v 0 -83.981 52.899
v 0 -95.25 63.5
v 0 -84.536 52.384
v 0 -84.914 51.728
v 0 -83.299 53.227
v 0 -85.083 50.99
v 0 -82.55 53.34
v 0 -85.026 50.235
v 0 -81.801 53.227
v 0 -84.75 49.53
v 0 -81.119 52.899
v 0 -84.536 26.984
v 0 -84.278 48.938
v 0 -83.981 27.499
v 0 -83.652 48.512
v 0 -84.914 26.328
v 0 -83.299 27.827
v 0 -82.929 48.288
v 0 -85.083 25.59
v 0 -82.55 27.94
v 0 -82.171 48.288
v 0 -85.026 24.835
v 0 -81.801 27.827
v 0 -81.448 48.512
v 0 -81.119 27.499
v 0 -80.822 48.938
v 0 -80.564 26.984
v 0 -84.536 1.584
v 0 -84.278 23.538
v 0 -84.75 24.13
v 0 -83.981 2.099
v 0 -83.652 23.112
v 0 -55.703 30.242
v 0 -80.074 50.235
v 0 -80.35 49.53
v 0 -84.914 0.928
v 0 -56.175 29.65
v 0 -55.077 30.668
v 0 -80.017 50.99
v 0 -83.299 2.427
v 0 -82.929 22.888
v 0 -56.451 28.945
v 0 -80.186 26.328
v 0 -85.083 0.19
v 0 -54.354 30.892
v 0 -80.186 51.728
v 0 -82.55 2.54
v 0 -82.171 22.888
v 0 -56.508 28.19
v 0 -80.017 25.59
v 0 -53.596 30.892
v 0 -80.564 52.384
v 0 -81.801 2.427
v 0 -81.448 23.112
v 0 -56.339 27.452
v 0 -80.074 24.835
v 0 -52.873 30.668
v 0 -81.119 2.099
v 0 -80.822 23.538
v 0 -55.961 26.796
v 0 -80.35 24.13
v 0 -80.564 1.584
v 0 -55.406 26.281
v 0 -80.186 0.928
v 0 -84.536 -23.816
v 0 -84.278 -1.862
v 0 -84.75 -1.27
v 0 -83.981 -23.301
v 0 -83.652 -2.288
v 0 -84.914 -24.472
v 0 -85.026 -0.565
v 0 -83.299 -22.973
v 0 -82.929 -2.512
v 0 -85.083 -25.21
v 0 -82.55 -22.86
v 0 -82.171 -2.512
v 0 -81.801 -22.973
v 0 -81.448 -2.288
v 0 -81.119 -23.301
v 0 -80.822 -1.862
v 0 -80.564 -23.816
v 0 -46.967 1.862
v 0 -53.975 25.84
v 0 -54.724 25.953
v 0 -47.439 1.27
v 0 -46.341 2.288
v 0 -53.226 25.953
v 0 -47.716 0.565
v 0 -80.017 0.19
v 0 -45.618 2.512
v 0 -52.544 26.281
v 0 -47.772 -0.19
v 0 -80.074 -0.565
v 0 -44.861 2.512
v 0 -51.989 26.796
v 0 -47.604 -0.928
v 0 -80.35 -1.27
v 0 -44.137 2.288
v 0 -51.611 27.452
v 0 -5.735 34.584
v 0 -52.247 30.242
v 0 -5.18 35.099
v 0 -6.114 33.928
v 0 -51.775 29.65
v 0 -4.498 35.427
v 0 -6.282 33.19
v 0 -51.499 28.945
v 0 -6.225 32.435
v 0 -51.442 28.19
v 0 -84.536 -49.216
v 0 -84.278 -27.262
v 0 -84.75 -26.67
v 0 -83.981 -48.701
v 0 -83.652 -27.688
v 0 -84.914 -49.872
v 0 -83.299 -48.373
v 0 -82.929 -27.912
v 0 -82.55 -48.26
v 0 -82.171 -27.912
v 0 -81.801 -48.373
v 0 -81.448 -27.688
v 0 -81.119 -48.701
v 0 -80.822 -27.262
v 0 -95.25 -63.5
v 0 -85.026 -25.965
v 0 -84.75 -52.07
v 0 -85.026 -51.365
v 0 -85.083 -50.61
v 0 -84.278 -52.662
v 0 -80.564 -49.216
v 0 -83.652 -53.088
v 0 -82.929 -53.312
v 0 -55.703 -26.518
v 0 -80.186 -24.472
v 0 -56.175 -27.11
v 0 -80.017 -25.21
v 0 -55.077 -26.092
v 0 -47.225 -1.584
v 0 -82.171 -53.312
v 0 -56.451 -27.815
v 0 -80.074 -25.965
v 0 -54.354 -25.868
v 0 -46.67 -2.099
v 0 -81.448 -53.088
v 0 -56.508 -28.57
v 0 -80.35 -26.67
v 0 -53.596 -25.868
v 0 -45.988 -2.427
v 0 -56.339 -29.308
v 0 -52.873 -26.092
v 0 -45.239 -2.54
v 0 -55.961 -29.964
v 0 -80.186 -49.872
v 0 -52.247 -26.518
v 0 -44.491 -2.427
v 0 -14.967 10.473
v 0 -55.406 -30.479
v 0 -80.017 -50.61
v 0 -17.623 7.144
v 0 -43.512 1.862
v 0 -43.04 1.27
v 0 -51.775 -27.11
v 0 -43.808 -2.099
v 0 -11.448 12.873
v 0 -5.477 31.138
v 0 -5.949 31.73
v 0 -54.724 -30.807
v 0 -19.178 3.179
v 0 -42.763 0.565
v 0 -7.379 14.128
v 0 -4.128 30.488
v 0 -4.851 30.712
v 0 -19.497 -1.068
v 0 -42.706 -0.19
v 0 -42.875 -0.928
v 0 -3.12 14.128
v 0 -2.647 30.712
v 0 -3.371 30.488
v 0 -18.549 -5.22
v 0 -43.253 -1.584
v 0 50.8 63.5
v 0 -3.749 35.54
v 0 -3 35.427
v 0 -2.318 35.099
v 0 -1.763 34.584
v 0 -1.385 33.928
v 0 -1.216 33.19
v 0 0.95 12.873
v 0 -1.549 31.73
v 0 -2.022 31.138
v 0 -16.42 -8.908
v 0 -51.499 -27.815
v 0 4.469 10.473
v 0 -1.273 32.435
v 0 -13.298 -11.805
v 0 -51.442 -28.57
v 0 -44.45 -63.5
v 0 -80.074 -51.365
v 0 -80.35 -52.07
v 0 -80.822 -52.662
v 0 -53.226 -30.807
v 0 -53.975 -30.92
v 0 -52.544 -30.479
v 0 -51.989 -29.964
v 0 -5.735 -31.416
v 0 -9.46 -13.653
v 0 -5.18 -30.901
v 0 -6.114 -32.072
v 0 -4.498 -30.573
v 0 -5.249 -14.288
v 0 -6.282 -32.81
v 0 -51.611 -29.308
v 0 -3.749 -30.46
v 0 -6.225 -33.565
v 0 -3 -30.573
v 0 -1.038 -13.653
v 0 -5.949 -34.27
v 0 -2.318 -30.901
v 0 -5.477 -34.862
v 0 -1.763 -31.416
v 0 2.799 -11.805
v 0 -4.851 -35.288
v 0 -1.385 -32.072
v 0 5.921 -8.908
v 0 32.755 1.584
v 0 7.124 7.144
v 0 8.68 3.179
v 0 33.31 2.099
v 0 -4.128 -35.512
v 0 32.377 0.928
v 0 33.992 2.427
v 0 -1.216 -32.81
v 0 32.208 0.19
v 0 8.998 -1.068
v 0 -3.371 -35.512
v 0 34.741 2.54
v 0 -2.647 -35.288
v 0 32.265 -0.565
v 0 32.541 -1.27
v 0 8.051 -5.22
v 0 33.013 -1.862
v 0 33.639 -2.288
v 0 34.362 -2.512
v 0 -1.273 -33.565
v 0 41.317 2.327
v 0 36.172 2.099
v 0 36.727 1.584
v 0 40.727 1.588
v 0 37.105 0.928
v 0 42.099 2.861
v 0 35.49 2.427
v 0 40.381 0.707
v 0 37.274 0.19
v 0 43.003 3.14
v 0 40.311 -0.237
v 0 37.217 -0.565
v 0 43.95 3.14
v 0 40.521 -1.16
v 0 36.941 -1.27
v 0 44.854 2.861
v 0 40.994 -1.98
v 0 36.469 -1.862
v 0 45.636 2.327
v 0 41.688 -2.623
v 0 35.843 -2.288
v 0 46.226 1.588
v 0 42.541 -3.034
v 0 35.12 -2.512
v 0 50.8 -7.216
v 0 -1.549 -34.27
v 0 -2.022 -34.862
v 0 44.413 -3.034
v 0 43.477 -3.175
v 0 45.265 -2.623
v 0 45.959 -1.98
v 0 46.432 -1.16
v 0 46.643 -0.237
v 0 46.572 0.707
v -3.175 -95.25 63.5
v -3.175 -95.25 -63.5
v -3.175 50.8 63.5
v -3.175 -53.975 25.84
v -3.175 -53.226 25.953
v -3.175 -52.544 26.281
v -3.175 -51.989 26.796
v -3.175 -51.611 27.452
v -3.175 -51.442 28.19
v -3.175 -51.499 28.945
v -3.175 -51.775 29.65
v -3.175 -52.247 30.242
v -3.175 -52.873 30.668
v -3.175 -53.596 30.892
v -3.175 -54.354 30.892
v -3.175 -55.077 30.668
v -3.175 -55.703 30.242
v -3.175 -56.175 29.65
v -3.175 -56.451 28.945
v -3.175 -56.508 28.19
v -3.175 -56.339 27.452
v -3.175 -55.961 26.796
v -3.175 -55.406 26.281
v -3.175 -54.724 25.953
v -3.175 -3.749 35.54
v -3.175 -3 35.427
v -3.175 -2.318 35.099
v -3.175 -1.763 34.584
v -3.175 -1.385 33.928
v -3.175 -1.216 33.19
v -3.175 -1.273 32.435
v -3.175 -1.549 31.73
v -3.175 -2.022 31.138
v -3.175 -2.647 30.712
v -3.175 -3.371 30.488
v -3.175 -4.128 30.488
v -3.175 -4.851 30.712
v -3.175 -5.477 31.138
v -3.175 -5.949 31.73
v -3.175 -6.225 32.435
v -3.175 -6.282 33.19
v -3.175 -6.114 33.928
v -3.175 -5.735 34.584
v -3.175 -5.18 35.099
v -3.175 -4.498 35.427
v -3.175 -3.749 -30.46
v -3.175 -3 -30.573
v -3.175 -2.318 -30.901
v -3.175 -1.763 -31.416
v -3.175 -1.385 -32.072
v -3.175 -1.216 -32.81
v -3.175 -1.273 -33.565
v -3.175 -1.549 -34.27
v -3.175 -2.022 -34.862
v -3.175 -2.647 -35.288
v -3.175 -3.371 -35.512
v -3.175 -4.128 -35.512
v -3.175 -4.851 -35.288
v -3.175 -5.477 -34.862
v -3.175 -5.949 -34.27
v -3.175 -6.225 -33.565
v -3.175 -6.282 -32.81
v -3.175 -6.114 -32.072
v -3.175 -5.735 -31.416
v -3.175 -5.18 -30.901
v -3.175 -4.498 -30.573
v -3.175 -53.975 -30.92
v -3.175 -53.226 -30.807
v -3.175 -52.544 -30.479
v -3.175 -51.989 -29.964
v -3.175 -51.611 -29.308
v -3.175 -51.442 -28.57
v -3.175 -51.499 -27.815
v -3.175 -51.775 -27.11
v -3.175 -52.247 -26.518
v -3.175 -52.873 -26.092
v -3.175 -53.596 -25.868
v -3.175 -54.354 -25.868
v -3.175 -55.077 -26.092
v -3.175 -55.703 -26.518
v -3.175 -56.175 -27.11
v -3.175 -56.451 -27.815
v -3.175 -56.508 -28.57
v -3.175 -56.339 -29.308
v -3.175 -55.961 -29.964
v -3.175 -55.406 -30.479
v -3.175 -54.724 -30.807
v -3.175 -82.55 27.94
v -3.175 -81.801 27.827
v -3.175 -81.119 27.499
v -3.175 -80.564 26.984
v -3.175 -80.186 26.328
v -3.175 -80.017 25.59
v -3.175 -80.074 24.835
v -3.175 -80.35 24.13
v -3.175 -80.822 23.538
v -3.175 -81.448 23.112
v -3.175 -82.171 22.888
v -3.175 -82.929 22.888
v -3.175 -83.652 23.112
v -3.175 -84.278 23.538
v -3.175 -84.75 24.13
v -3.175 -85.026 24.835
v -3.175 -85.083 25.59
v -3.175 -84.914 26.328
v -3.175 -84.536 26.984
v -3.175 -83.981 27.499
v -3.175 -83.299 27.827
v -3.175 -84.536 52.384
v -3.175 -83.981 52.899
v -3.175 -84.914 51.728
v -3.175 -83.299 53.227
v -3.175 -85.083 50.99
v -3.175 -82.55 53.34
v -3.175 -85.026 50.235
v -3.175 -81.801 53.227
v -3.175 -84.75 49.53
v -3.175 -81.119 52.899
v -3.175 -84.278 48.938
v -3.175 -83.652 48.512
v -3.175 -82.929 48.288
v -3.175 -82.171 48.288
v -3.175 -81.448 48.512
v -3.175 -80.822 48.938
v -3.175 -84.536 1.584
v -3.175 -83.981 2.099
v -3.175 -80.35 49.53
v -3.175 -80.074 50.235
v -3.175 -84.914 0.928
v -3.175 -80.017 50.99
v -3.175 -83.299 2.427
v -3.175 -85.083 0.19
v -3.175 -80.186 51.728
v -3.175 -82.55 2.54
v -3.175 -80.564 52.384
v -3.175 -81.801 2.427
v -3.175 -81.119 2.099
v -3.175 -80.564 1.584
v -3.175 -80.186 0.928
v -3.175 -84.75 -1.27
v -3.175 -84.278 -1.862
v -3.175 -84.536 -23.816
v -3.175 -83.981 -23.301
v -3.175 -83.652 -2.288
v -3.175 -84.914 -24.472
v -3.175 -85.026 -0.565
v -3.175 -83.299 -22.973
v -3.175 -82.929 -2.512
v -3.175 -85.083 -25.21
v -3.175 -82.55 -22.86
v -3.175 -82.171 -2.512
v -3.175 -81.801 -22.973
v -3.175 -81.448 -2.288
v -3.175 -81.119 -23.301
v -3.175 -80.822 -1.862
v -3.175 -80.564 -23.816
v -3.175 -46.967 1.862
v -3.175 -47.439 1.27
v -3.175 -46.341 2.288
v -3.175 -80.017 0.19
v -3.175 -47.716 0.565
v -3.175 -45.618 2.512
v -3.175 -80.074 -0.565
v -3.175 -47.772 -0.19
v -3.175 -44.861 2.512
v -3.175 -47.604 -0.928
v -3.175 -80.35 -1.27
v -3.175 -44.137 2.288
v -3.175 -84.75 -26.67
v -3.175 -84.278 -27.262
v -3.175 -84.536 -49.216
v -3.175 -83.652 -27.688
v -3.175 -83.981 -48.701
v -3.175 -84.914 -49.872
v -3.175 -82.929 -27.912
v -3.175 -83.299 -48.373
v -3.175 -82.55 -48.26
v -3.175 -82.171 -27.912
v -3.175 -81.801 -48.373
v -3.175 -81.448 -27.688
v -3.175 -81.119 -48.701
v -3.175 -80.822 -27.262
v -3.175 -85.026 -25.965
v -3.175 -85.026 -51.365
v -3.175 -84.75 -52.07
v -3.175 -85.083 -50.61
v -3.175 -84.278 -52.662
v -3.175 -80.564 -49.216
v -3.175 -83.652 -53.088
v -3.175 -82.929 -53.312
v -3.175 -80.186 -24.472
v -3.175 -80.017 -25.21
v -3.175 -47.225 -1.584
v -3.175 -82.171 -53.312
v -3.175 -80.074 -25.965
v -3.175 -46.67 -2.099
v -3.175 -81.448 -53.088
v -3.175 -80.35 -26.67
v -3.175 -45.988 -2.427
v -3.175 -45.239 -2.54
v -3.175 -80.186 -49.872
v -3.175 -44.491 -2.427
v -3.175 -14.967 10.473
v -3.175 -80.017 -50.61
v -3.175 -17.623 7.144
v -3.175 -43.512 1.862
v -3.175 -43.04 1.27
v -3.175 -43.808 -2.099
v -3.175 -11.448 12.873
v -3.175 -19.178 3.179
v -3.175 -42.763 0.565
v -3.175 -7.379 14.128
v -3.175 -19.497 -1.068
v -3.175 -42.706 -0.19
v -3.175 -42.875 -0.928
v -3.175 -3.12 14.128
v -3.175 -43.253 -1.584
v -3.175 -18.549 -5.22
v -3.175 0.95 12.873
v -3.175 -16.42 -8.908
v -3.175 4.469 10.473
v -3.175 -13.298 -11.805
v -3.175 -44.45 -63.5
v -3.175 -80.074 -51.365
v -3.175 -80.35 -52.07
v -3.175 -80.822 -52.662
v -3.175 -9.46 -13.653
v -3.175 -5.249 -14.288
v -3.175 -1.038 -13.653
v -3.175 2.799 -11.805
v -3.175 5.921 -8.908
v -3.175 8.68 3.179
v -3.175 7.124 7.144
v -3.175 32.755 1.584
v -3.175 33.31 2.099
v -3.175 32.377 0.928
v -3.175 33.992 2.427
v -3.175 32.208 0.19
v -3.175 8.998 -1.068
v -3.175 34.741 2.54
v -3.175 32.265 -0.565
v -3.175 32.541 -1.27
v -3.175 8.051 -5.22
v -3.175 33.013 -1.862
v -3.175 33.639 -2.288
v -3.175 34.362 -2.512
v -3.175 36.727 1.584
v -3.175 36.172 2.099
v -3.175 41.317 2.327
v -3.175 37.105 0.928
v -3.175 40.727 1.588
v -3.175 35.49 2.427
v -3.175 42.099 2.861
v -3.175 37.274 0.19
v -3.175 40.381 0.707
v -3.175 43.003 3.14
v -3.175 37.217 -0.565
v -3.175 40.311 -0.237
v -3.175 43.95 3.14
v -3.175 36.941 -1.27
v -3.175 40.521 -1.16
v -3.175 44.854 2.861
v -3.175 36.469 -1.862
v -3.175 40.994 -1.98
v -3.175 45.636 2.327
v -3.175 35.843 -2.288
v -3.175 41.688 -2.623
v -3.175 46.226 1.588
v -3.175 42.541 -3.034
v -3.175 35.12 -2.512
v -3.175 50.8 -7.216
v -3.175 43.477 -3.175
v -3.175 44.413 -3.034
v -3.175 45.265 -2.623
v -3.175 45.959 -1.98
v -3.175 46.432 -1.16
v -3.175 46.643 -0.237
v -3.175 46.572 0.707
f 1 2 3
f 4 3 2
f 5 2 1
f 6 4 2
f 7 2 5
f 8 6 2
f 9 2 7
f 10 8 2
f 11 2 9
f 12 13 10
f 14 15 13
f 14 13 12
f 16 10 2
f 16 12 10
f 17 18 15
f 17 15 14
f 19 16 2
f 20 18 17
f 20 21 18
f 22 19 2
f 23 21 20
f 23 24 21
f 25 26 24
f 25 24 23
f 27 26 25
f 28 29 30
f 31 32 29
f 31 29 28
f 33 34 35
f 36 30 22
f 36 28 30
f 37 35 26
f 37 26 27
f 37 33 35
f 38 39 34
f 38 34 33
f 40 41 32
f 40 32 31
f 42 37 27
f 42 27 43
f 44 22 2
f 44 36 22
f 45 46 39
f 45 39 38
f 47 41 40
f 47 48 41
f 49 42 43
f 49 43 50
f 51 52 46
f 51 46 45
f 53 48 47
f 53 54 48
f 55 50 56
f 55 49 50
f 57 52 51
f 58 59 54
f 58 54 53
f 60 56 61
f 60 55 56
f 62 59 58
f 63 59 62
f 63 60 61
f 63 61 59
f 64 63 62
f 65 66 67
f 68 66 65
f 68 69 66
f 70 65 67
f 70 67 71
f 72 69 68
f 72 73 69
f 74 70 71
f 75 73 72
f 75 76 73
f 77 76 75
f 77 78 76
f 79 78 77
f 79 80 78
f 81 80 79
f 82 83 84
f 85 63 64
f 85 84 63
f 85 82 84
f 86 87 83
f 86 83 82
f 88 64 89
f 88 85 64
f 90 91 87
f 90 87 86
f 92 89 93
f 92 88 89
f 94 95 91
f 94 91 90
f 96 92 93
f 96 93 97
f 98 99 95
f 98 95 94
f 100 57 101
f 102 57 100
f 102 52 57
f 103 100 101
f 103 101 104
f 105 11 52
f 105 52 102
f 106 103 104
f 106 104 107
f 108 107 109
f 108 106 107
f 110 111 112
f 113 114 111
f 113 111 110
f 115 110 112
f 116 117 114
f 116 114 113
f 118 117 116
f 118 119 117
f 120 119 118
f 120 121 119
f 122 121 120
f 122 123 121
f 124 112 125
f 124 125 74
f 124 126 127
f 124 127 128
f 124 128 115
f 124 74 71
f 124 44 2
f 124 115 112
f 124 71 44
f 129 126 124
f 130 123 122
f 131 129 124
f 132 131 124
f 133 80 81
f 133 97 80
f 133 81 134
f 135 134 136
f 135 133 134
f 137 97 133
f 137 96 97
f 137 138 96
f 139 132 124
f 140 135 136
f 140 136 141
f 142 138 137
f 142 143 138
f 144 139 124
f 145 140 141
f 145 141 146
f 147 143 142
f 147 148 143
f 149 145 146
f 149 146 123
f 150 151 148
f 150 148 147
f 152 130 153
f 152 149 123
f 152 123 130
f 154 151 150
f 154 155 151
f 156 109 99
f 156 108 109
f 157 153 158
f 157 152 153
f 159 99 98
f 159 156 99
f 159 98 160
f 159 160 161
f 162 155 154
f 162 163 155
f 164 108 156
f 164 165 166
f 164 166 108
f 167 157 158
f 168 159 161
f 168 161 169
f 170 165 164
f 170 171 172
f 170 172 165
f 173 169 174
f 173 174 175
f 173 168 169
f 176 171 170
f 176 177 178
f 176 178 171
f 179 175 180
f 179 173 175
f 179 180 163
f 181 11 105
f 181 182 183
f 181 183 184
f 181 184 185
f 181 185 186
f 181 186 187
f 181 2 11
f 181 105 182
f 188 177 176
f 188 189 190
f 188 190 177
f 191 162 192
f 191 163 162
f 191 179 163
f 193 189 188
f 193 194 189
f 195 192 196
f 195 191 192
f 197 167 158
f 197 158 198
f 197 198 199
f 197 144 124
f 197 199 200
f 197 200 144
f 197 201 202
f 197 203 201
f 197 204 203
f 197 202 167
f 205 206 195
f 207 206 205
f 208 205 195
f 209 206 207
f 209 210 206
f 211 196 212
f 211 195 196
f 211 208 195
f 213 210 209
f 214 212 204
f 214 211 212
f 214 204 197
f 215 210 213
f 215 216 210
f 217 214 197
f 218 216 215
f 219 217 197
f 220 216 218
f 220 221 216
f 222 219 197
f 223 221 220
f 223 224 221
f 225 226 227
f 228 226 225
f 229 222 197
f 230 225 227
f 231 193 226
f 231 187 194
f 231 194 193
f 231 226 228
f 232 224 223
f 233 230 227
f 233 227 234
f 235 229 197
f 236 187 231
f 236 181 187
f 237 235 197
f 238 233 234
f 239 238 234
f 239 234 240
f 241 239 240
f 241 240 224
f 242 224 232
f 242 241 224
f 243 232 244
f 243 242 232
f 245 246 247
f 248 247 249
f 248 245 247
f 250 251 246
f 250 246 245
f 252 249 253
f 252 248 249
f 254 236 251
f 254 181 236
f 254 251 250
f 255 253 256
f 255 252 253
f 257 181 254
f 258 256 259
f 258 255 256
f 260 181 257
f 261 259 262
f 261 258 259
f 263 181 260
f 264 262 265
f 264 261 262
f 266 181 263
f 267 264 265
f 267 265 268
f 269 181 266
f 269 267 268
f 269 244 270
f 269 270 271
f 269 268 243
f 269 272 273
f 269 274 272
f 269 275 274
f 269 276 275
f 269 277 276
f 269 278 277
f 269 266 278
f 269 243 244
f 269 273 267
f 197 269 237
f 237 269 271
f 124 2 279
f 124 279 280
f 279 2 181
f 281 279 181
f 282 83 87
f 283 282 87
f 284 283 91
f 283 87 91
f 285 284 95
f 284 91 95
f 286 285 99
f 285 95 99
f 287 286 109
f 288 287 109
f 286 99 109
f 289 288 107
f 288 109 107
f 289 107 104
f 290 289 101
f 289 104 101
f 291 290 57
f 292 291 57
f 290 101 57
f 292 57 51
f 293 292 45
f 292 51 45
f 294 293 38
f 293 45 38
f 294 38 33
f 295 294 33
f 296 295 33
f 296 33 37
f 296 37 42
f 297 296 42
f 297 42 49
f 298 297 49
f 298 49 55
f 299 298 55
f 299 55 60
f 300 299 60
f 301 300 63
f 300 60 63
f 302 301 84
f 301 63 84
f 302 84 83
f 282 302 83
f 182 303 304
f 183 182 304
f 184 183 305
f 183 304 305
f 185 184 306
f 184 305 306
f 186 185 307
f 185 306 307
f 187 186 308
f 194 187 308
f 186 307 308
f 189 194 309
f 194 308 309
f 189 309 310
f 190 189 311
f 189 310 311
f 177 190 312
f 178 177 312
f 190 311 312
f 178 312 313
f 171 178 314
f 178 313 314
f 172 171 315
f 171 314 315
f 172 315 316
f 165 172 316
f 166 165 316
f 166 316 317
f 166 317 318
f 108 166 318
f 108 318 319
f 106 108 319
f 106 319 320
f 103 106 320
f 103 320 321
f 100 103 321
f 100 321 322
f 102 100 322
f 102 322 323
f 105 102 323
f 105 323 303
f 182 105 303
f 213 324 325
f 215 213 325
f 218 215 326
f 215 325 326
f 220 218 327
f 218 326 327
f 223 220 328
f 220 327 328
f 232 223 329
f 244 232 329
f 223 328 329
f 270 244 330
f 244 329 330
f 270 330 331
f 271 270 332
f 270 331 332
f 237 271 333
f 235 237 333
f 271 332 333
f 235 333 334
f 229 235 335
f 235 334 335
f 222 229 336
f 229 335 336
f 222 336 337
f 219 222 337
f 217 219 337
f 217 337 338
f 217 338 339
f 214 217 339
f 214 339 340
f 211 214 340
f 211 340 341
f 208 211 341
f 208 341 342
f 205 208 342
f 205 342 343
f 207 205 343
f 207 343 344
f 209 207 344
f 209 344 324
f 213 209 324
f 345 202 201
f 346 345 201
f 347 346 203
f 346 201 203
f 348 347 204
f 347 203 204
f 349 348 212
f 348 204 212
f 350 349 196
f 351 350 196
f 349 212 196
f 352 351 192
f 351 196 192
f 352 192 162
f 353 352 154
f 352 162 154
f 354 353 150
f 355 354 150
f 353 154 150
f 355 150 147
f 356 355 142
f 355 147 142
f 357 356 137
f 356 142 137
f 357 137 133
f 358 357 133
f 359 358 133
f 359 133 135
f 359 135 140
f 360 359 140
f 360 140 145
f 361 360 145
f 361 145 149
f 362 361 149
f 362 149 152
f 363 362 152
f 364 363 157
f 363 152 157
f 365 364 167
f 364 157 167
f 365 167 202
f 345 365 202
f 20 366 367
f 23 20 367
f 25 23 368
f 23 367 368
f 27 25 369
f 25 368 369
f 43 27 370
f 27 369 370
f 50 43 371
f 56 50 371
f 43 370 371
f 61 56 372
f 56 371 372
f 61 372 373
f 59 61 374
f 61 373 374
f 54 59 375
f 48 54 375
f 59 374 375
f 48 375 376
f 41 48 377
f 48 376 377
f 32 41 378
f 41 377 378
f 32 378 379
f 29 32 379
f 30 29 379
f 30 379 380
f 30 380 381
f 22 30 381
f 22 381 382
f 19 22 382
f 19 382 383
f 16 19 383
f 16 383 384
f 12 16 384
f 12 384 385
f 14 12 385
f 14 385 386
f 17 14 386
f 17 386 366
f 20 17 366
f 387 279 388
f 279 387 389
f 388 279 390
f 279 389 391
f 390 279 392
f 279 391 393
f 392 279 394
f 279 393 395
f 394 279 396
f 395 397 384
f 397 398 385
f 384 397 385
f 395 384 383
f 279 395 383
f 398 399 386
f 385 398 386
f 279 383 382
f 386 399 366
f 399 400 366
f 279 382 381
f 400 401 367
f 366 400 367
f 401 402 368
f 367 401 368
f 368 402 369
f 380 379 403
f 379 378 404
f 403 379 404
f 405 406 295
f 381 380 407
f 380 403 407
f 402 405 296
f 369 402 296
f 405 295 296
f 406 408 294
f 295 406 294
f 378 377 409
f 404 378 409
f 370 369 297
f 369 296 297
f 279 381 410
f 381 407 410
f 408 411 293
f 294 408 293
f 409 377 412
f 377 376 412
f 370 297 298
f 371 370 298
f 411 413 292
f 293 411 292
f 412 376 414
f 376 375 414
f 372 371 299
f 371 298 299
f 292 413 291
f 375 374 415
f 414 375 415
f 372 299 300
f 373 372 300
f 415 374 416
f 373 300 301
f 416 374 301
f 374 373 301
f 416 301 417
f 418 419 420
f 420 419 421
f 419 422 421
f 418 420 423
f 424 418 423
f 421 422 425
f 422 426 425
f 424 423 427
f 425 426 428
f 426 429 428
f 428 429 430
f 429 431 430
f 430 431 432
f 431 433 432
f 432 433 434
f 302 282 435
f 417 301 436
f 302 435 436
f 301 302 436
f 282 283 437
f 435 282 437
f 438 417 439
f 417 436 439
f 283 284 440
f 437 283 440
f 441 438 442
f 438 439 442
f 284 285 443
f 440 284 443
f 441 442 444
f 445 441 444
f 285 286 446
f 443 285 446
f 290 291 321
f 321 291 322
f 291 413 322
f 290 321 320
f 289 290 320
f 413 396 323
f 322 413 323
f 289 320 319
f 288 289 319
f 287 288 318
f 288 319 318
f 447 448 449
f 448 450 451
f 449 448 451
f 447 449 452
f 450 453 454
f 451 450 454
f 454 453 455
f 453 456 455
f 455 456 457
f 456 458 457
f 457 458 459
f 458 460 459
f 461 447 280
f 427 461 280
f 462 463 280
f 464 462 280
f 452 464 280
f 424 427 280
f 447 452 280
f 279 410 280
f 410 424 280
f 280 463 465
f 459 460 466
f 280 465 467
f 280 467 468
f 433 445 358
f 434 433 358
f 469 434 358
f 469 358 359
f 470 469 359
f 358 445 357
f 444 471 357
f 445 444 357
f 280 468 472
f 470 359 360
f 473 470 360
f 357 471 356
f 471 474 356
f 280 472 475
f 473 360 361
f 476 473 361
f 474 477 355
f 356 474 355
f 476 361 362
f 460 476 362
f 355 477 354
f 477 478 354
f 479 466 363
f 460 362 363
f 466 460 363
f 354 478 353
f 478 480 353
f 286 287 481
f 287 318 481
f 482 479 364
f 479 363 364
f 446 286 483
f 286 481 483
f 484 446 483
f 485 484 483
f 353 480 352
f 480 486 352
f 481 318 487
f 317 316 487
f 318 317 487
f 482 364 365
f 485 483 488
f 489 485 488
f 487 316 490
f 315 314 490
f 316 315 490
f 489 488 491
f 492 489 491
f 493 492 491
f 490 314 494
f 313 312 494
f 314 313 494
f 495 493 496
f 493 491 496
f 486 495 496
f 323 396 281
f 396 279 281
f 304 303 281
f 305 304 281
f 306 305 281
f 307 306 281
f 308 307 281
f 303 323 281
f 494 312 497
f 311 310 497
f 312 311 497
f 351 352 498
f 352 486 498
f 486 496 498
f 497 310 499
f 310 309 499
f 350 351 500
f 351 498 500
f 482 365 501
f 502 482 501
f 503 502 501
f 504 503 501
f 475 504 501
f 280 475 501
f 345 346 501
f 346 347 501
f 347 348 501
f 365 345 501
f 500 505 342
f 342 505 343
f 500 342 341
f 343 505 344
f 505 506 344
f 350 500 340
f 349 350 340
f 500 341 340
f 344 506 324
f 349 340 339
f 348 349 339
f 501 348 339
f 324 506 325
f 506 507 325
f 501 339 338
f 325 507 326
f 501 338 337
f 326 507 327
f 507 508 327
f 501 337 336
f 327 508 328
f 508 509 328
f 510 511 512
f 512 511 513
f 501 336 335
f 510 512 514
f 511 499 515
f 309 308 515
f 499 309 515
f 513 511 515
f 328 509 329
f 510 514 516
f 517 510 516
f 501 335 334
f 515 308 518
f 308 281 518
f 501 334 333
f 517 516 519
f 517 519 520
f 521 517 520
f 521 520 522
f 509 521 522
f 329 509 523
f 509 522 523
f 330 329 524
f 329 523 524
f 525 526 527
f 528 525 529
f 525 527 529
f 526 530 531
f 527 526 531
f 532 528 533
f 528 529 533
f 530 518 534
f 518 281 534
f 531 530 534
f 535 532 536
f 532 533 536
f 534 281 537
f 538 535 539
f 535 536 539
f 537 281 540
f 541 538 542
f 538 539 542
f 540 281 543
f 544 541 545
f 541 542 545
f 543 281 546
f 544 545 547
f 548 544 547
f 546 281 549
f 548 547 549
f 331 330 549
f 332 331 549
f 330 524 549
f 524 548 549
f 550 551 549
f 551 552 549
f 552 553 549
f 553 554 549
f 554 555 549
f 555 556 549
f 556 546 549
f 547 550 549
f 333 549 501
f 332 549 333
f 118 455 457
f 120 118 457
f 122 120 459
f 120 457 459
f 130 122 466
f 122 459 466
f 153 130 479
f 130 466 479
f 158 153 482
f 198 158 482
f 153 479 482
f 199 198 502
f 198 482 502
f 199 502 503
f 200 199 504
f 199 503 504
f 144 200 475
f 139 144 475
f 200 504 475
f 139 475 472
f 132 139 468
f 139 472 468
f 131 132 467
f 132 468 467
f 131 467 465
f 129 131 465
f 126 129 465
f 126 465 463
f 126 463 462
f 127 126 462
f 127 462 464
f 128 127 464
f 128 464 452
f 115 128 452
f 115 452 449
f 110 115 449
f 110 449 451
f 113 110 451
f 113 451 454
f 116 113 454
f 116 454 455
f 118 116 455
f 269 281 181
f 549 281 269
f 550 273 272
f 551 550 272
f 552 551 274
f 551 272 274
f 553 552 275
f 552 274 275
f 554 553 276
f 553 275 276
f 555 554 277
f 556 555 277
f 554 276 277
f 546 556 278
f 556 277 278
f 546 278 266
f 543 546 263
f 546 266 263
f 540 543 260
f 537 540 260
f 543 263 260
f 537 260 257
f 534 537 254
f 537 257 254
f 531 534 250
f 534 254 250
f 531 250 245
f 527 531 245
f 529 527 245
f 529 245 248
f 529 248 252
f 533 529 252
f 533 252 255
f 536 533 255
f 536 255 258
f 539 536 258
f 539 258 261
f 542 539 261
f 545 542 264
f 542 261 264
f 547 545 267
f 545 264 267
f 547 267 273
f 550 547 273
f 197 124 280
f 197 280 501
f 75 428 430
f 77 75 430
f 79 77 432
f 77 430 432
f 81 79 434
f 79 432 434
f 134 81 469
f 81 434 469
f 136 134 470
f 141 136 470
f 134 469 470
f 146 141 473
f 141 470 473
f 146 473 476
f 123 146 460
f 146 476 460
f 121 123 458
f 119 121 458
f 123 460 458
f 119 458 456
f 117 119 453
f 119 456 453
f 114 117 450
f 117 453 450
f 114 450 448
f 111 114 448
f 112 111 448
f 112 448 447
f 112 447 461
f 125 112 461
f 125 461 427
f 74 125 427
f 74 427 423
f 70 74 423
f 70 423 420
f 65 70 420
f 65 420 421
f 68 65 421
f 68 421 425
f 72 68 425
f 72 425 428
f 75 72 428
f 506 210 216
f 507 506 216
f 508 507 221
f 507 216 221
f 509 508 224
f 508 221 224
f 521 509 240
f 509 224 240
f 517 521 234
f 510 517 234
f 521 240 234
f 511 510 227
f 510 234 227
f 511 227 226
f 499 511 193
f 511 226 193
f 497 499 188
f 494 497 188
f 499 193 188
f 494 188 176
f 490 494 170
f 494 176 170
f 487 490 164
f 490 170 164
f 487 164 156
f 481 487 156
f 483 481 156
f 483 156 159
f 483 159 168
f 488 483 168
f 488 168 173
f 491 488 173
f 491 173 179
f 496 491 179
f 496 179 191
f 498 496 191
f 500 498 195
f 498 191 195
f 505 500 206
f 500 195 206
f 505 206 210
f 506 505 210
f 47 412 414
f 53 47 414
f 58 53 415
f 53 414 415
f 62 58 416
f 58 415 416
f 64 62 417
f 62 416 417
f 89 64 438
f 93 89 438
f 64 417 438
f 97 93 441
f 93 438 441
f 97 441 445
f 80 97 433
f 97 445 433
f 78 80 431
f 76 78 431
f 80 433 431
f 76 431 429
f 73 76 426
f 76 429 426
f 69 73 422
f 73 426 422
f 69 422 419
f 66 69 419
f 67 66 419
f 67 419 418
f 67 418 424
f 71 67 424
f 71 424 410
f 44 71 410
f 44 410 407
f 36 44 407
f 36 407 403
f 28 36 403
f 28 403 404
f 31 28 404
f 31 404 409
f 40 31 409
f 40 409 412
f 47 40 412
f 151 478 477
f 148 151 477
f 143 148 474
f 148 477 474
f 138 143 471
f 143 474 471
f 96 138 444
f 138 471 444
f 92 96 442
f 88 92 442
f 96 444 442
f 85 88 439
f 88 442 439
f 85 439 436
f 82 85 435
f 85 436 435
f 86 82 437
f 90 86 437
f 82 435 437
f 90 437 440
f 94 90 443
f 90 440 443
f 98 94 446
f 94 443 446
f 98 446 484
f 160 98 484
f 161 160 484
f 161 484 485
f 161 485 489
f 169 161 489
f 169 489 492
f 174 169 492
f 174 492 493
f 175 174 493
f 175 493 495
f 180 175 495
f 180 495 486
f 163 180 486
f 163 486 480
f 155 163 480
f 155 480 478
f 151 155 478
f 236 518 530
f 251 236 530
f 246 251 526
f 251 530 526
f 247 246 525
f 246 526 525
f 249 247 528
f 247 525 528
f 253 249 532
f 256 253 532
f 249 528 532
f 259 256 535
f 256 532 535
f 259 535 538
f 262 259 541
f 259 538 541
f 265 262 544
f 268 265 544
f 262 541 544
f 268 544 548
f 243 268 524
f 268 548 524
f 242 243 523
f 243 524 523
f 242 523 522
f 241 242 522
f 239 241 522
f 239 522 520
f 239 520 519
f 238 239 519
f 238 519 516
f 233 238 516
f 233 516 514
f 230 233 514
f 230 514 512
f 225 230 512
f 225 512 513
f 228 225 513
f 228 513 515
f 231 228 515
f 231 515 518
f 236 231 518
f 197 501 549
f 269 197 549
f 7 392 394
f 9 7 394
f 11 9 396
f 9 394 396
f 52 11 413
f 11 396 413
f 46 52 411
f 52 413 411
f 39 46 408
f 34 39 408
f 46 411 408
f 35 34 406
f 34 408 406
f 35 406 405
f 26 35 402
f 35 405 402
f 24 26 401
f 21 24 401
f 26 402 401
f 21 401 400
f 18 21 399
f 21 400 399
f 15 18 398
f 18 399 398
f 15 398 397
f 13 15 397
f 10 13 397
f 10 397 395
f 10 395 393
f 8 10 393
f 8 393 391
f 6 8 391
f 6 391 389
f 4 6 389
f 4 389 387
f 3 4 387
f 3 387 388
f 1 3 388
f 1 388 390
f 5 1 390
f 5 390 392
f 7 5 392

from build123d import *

# Parameters (mm, degrees)
SKETCH1_W          = 127
SKETCH1_H          = 190.5
BASE_FLANGE1_DEPTH = 3.175
SKETCH7_R          = 2.54
SKETCH7_R_2        = 3.175
SKETCH7_R_3        = 14.2875
CUT_EXTRUDE1_DEPTH = 3.175
SKETCH10_R         = 2.54
CUT_EXTRUDE2_DEPTH = 115.52027386
CUT_EXTRUDE3_DEPTH = 115.52027386
CUT_EXTRUDE4_DEPTH = 115.52027386
SKETCH13_R         = 2.54
CUT_EXTRUDE5_DEPTH = 115.52027386


# Sheet-metal steps are written as plain solids
with BuildPart() as part:
    # Sketch1 → Base-Flange1 (new body)
    with BuildSketch(Plane(origin=(0, 0, 0), x_dir=(0, 0, -1), z_dir=(1, 0, 0))):
        Rectangle(SKETCH1_W, SKETCH1_H)
    extrude(amount=-BASE_FLANGE1_DEPTH)

    # Sketch7 → Cut-Extrude1 (cut)
    with BuildSketch(Plane(origin=(0, 0, 0), x_dir=(0, 0, -1), z_dir=(1, 0, 0))):
        with Locations((-28.380000009, -53.975)):
            Circle(SKETCH7_R)
        with Locations((28.380000009, -53.975)):
            Circle(SKETCH7_R)
        with Locations((0, 43.476657776)):
            Circle(SKETCH7_R_2)
        with Locations((0, -5.249171112)):
            Circle(SKETCH7_R_3)
    extrude(amount=-CUT_EXTRUDE1_DEPTH, mode=Mode.SUBTRACT)

    # Sketch10 → Cut-Extrude2 (cut, through all)
    with BuildSketch(Plane.ZY.offset(3.175)):
        with Locations((0, 34.740957442)):
            Circle(SKETCH10_R)
        with Locations((33.00000004, -3.749171064)):
            Circle(SKETCH10_R)
        with Locations((-33.00000004, -3.749171064)):
            Circle(SKETCH10_R)
        with Locations(Location((0, -45.239299666, 0), (0, 0, 180))):
            Circle(SKETCH10_R)
    extrude(amount=-CUT_EXTRUDE2_DEPTH, mode=Mode.SUBTRACT)

    # Sketch11 → Cut-Extrude3 (cut, through all)
    with BuildSketch(Plane.ZY.offset(3.175)):
        Polygon((-63.5, 95.25), (-63.5, -44.45), (19.05, 95.25), align=None)
    extrude(amount=-CUT_EXTRUDE3_DEPTH, mode=Mode.SUBTRACT)

    # Sketch12 → Cut-Extrude4 (cut, through all)
    with BuildSketch(Plane.ZY.offset(3.175)):
        Polygon((63.5, 50.8), (-7.215909091, 50.8), (19.05, 95.25), (63.5, 95.25), align=None)
    extrude(amount=-CUT_EXTRUDE4_DEPTH, mode=Mode.SUBTRACT)

    # Sketch13 → Cut-Extrude5 (cut, through all)
    with BuildSketch(Plane.ZY.offset(3.175)):
        with Locations((-50.8, -82.55)):
            Circle(SKETCH13_R)
        with Locations((0, -82.55)):
            Circle(SKETCH13_R)
        with Locations((50.8, -82.55)):
            Circle(SKETCH13_R)
        with Locations((-25.4, -82.55)):
            Circle(SKETCH13_R)
        with Locations((25.4, -82.55)):
            Circle(SKETCH13_R)
    extrude(amount=-CUT_EXTRUDE5_DEPTH, mode=Mode.SUBTRACT)


solid = part.part
